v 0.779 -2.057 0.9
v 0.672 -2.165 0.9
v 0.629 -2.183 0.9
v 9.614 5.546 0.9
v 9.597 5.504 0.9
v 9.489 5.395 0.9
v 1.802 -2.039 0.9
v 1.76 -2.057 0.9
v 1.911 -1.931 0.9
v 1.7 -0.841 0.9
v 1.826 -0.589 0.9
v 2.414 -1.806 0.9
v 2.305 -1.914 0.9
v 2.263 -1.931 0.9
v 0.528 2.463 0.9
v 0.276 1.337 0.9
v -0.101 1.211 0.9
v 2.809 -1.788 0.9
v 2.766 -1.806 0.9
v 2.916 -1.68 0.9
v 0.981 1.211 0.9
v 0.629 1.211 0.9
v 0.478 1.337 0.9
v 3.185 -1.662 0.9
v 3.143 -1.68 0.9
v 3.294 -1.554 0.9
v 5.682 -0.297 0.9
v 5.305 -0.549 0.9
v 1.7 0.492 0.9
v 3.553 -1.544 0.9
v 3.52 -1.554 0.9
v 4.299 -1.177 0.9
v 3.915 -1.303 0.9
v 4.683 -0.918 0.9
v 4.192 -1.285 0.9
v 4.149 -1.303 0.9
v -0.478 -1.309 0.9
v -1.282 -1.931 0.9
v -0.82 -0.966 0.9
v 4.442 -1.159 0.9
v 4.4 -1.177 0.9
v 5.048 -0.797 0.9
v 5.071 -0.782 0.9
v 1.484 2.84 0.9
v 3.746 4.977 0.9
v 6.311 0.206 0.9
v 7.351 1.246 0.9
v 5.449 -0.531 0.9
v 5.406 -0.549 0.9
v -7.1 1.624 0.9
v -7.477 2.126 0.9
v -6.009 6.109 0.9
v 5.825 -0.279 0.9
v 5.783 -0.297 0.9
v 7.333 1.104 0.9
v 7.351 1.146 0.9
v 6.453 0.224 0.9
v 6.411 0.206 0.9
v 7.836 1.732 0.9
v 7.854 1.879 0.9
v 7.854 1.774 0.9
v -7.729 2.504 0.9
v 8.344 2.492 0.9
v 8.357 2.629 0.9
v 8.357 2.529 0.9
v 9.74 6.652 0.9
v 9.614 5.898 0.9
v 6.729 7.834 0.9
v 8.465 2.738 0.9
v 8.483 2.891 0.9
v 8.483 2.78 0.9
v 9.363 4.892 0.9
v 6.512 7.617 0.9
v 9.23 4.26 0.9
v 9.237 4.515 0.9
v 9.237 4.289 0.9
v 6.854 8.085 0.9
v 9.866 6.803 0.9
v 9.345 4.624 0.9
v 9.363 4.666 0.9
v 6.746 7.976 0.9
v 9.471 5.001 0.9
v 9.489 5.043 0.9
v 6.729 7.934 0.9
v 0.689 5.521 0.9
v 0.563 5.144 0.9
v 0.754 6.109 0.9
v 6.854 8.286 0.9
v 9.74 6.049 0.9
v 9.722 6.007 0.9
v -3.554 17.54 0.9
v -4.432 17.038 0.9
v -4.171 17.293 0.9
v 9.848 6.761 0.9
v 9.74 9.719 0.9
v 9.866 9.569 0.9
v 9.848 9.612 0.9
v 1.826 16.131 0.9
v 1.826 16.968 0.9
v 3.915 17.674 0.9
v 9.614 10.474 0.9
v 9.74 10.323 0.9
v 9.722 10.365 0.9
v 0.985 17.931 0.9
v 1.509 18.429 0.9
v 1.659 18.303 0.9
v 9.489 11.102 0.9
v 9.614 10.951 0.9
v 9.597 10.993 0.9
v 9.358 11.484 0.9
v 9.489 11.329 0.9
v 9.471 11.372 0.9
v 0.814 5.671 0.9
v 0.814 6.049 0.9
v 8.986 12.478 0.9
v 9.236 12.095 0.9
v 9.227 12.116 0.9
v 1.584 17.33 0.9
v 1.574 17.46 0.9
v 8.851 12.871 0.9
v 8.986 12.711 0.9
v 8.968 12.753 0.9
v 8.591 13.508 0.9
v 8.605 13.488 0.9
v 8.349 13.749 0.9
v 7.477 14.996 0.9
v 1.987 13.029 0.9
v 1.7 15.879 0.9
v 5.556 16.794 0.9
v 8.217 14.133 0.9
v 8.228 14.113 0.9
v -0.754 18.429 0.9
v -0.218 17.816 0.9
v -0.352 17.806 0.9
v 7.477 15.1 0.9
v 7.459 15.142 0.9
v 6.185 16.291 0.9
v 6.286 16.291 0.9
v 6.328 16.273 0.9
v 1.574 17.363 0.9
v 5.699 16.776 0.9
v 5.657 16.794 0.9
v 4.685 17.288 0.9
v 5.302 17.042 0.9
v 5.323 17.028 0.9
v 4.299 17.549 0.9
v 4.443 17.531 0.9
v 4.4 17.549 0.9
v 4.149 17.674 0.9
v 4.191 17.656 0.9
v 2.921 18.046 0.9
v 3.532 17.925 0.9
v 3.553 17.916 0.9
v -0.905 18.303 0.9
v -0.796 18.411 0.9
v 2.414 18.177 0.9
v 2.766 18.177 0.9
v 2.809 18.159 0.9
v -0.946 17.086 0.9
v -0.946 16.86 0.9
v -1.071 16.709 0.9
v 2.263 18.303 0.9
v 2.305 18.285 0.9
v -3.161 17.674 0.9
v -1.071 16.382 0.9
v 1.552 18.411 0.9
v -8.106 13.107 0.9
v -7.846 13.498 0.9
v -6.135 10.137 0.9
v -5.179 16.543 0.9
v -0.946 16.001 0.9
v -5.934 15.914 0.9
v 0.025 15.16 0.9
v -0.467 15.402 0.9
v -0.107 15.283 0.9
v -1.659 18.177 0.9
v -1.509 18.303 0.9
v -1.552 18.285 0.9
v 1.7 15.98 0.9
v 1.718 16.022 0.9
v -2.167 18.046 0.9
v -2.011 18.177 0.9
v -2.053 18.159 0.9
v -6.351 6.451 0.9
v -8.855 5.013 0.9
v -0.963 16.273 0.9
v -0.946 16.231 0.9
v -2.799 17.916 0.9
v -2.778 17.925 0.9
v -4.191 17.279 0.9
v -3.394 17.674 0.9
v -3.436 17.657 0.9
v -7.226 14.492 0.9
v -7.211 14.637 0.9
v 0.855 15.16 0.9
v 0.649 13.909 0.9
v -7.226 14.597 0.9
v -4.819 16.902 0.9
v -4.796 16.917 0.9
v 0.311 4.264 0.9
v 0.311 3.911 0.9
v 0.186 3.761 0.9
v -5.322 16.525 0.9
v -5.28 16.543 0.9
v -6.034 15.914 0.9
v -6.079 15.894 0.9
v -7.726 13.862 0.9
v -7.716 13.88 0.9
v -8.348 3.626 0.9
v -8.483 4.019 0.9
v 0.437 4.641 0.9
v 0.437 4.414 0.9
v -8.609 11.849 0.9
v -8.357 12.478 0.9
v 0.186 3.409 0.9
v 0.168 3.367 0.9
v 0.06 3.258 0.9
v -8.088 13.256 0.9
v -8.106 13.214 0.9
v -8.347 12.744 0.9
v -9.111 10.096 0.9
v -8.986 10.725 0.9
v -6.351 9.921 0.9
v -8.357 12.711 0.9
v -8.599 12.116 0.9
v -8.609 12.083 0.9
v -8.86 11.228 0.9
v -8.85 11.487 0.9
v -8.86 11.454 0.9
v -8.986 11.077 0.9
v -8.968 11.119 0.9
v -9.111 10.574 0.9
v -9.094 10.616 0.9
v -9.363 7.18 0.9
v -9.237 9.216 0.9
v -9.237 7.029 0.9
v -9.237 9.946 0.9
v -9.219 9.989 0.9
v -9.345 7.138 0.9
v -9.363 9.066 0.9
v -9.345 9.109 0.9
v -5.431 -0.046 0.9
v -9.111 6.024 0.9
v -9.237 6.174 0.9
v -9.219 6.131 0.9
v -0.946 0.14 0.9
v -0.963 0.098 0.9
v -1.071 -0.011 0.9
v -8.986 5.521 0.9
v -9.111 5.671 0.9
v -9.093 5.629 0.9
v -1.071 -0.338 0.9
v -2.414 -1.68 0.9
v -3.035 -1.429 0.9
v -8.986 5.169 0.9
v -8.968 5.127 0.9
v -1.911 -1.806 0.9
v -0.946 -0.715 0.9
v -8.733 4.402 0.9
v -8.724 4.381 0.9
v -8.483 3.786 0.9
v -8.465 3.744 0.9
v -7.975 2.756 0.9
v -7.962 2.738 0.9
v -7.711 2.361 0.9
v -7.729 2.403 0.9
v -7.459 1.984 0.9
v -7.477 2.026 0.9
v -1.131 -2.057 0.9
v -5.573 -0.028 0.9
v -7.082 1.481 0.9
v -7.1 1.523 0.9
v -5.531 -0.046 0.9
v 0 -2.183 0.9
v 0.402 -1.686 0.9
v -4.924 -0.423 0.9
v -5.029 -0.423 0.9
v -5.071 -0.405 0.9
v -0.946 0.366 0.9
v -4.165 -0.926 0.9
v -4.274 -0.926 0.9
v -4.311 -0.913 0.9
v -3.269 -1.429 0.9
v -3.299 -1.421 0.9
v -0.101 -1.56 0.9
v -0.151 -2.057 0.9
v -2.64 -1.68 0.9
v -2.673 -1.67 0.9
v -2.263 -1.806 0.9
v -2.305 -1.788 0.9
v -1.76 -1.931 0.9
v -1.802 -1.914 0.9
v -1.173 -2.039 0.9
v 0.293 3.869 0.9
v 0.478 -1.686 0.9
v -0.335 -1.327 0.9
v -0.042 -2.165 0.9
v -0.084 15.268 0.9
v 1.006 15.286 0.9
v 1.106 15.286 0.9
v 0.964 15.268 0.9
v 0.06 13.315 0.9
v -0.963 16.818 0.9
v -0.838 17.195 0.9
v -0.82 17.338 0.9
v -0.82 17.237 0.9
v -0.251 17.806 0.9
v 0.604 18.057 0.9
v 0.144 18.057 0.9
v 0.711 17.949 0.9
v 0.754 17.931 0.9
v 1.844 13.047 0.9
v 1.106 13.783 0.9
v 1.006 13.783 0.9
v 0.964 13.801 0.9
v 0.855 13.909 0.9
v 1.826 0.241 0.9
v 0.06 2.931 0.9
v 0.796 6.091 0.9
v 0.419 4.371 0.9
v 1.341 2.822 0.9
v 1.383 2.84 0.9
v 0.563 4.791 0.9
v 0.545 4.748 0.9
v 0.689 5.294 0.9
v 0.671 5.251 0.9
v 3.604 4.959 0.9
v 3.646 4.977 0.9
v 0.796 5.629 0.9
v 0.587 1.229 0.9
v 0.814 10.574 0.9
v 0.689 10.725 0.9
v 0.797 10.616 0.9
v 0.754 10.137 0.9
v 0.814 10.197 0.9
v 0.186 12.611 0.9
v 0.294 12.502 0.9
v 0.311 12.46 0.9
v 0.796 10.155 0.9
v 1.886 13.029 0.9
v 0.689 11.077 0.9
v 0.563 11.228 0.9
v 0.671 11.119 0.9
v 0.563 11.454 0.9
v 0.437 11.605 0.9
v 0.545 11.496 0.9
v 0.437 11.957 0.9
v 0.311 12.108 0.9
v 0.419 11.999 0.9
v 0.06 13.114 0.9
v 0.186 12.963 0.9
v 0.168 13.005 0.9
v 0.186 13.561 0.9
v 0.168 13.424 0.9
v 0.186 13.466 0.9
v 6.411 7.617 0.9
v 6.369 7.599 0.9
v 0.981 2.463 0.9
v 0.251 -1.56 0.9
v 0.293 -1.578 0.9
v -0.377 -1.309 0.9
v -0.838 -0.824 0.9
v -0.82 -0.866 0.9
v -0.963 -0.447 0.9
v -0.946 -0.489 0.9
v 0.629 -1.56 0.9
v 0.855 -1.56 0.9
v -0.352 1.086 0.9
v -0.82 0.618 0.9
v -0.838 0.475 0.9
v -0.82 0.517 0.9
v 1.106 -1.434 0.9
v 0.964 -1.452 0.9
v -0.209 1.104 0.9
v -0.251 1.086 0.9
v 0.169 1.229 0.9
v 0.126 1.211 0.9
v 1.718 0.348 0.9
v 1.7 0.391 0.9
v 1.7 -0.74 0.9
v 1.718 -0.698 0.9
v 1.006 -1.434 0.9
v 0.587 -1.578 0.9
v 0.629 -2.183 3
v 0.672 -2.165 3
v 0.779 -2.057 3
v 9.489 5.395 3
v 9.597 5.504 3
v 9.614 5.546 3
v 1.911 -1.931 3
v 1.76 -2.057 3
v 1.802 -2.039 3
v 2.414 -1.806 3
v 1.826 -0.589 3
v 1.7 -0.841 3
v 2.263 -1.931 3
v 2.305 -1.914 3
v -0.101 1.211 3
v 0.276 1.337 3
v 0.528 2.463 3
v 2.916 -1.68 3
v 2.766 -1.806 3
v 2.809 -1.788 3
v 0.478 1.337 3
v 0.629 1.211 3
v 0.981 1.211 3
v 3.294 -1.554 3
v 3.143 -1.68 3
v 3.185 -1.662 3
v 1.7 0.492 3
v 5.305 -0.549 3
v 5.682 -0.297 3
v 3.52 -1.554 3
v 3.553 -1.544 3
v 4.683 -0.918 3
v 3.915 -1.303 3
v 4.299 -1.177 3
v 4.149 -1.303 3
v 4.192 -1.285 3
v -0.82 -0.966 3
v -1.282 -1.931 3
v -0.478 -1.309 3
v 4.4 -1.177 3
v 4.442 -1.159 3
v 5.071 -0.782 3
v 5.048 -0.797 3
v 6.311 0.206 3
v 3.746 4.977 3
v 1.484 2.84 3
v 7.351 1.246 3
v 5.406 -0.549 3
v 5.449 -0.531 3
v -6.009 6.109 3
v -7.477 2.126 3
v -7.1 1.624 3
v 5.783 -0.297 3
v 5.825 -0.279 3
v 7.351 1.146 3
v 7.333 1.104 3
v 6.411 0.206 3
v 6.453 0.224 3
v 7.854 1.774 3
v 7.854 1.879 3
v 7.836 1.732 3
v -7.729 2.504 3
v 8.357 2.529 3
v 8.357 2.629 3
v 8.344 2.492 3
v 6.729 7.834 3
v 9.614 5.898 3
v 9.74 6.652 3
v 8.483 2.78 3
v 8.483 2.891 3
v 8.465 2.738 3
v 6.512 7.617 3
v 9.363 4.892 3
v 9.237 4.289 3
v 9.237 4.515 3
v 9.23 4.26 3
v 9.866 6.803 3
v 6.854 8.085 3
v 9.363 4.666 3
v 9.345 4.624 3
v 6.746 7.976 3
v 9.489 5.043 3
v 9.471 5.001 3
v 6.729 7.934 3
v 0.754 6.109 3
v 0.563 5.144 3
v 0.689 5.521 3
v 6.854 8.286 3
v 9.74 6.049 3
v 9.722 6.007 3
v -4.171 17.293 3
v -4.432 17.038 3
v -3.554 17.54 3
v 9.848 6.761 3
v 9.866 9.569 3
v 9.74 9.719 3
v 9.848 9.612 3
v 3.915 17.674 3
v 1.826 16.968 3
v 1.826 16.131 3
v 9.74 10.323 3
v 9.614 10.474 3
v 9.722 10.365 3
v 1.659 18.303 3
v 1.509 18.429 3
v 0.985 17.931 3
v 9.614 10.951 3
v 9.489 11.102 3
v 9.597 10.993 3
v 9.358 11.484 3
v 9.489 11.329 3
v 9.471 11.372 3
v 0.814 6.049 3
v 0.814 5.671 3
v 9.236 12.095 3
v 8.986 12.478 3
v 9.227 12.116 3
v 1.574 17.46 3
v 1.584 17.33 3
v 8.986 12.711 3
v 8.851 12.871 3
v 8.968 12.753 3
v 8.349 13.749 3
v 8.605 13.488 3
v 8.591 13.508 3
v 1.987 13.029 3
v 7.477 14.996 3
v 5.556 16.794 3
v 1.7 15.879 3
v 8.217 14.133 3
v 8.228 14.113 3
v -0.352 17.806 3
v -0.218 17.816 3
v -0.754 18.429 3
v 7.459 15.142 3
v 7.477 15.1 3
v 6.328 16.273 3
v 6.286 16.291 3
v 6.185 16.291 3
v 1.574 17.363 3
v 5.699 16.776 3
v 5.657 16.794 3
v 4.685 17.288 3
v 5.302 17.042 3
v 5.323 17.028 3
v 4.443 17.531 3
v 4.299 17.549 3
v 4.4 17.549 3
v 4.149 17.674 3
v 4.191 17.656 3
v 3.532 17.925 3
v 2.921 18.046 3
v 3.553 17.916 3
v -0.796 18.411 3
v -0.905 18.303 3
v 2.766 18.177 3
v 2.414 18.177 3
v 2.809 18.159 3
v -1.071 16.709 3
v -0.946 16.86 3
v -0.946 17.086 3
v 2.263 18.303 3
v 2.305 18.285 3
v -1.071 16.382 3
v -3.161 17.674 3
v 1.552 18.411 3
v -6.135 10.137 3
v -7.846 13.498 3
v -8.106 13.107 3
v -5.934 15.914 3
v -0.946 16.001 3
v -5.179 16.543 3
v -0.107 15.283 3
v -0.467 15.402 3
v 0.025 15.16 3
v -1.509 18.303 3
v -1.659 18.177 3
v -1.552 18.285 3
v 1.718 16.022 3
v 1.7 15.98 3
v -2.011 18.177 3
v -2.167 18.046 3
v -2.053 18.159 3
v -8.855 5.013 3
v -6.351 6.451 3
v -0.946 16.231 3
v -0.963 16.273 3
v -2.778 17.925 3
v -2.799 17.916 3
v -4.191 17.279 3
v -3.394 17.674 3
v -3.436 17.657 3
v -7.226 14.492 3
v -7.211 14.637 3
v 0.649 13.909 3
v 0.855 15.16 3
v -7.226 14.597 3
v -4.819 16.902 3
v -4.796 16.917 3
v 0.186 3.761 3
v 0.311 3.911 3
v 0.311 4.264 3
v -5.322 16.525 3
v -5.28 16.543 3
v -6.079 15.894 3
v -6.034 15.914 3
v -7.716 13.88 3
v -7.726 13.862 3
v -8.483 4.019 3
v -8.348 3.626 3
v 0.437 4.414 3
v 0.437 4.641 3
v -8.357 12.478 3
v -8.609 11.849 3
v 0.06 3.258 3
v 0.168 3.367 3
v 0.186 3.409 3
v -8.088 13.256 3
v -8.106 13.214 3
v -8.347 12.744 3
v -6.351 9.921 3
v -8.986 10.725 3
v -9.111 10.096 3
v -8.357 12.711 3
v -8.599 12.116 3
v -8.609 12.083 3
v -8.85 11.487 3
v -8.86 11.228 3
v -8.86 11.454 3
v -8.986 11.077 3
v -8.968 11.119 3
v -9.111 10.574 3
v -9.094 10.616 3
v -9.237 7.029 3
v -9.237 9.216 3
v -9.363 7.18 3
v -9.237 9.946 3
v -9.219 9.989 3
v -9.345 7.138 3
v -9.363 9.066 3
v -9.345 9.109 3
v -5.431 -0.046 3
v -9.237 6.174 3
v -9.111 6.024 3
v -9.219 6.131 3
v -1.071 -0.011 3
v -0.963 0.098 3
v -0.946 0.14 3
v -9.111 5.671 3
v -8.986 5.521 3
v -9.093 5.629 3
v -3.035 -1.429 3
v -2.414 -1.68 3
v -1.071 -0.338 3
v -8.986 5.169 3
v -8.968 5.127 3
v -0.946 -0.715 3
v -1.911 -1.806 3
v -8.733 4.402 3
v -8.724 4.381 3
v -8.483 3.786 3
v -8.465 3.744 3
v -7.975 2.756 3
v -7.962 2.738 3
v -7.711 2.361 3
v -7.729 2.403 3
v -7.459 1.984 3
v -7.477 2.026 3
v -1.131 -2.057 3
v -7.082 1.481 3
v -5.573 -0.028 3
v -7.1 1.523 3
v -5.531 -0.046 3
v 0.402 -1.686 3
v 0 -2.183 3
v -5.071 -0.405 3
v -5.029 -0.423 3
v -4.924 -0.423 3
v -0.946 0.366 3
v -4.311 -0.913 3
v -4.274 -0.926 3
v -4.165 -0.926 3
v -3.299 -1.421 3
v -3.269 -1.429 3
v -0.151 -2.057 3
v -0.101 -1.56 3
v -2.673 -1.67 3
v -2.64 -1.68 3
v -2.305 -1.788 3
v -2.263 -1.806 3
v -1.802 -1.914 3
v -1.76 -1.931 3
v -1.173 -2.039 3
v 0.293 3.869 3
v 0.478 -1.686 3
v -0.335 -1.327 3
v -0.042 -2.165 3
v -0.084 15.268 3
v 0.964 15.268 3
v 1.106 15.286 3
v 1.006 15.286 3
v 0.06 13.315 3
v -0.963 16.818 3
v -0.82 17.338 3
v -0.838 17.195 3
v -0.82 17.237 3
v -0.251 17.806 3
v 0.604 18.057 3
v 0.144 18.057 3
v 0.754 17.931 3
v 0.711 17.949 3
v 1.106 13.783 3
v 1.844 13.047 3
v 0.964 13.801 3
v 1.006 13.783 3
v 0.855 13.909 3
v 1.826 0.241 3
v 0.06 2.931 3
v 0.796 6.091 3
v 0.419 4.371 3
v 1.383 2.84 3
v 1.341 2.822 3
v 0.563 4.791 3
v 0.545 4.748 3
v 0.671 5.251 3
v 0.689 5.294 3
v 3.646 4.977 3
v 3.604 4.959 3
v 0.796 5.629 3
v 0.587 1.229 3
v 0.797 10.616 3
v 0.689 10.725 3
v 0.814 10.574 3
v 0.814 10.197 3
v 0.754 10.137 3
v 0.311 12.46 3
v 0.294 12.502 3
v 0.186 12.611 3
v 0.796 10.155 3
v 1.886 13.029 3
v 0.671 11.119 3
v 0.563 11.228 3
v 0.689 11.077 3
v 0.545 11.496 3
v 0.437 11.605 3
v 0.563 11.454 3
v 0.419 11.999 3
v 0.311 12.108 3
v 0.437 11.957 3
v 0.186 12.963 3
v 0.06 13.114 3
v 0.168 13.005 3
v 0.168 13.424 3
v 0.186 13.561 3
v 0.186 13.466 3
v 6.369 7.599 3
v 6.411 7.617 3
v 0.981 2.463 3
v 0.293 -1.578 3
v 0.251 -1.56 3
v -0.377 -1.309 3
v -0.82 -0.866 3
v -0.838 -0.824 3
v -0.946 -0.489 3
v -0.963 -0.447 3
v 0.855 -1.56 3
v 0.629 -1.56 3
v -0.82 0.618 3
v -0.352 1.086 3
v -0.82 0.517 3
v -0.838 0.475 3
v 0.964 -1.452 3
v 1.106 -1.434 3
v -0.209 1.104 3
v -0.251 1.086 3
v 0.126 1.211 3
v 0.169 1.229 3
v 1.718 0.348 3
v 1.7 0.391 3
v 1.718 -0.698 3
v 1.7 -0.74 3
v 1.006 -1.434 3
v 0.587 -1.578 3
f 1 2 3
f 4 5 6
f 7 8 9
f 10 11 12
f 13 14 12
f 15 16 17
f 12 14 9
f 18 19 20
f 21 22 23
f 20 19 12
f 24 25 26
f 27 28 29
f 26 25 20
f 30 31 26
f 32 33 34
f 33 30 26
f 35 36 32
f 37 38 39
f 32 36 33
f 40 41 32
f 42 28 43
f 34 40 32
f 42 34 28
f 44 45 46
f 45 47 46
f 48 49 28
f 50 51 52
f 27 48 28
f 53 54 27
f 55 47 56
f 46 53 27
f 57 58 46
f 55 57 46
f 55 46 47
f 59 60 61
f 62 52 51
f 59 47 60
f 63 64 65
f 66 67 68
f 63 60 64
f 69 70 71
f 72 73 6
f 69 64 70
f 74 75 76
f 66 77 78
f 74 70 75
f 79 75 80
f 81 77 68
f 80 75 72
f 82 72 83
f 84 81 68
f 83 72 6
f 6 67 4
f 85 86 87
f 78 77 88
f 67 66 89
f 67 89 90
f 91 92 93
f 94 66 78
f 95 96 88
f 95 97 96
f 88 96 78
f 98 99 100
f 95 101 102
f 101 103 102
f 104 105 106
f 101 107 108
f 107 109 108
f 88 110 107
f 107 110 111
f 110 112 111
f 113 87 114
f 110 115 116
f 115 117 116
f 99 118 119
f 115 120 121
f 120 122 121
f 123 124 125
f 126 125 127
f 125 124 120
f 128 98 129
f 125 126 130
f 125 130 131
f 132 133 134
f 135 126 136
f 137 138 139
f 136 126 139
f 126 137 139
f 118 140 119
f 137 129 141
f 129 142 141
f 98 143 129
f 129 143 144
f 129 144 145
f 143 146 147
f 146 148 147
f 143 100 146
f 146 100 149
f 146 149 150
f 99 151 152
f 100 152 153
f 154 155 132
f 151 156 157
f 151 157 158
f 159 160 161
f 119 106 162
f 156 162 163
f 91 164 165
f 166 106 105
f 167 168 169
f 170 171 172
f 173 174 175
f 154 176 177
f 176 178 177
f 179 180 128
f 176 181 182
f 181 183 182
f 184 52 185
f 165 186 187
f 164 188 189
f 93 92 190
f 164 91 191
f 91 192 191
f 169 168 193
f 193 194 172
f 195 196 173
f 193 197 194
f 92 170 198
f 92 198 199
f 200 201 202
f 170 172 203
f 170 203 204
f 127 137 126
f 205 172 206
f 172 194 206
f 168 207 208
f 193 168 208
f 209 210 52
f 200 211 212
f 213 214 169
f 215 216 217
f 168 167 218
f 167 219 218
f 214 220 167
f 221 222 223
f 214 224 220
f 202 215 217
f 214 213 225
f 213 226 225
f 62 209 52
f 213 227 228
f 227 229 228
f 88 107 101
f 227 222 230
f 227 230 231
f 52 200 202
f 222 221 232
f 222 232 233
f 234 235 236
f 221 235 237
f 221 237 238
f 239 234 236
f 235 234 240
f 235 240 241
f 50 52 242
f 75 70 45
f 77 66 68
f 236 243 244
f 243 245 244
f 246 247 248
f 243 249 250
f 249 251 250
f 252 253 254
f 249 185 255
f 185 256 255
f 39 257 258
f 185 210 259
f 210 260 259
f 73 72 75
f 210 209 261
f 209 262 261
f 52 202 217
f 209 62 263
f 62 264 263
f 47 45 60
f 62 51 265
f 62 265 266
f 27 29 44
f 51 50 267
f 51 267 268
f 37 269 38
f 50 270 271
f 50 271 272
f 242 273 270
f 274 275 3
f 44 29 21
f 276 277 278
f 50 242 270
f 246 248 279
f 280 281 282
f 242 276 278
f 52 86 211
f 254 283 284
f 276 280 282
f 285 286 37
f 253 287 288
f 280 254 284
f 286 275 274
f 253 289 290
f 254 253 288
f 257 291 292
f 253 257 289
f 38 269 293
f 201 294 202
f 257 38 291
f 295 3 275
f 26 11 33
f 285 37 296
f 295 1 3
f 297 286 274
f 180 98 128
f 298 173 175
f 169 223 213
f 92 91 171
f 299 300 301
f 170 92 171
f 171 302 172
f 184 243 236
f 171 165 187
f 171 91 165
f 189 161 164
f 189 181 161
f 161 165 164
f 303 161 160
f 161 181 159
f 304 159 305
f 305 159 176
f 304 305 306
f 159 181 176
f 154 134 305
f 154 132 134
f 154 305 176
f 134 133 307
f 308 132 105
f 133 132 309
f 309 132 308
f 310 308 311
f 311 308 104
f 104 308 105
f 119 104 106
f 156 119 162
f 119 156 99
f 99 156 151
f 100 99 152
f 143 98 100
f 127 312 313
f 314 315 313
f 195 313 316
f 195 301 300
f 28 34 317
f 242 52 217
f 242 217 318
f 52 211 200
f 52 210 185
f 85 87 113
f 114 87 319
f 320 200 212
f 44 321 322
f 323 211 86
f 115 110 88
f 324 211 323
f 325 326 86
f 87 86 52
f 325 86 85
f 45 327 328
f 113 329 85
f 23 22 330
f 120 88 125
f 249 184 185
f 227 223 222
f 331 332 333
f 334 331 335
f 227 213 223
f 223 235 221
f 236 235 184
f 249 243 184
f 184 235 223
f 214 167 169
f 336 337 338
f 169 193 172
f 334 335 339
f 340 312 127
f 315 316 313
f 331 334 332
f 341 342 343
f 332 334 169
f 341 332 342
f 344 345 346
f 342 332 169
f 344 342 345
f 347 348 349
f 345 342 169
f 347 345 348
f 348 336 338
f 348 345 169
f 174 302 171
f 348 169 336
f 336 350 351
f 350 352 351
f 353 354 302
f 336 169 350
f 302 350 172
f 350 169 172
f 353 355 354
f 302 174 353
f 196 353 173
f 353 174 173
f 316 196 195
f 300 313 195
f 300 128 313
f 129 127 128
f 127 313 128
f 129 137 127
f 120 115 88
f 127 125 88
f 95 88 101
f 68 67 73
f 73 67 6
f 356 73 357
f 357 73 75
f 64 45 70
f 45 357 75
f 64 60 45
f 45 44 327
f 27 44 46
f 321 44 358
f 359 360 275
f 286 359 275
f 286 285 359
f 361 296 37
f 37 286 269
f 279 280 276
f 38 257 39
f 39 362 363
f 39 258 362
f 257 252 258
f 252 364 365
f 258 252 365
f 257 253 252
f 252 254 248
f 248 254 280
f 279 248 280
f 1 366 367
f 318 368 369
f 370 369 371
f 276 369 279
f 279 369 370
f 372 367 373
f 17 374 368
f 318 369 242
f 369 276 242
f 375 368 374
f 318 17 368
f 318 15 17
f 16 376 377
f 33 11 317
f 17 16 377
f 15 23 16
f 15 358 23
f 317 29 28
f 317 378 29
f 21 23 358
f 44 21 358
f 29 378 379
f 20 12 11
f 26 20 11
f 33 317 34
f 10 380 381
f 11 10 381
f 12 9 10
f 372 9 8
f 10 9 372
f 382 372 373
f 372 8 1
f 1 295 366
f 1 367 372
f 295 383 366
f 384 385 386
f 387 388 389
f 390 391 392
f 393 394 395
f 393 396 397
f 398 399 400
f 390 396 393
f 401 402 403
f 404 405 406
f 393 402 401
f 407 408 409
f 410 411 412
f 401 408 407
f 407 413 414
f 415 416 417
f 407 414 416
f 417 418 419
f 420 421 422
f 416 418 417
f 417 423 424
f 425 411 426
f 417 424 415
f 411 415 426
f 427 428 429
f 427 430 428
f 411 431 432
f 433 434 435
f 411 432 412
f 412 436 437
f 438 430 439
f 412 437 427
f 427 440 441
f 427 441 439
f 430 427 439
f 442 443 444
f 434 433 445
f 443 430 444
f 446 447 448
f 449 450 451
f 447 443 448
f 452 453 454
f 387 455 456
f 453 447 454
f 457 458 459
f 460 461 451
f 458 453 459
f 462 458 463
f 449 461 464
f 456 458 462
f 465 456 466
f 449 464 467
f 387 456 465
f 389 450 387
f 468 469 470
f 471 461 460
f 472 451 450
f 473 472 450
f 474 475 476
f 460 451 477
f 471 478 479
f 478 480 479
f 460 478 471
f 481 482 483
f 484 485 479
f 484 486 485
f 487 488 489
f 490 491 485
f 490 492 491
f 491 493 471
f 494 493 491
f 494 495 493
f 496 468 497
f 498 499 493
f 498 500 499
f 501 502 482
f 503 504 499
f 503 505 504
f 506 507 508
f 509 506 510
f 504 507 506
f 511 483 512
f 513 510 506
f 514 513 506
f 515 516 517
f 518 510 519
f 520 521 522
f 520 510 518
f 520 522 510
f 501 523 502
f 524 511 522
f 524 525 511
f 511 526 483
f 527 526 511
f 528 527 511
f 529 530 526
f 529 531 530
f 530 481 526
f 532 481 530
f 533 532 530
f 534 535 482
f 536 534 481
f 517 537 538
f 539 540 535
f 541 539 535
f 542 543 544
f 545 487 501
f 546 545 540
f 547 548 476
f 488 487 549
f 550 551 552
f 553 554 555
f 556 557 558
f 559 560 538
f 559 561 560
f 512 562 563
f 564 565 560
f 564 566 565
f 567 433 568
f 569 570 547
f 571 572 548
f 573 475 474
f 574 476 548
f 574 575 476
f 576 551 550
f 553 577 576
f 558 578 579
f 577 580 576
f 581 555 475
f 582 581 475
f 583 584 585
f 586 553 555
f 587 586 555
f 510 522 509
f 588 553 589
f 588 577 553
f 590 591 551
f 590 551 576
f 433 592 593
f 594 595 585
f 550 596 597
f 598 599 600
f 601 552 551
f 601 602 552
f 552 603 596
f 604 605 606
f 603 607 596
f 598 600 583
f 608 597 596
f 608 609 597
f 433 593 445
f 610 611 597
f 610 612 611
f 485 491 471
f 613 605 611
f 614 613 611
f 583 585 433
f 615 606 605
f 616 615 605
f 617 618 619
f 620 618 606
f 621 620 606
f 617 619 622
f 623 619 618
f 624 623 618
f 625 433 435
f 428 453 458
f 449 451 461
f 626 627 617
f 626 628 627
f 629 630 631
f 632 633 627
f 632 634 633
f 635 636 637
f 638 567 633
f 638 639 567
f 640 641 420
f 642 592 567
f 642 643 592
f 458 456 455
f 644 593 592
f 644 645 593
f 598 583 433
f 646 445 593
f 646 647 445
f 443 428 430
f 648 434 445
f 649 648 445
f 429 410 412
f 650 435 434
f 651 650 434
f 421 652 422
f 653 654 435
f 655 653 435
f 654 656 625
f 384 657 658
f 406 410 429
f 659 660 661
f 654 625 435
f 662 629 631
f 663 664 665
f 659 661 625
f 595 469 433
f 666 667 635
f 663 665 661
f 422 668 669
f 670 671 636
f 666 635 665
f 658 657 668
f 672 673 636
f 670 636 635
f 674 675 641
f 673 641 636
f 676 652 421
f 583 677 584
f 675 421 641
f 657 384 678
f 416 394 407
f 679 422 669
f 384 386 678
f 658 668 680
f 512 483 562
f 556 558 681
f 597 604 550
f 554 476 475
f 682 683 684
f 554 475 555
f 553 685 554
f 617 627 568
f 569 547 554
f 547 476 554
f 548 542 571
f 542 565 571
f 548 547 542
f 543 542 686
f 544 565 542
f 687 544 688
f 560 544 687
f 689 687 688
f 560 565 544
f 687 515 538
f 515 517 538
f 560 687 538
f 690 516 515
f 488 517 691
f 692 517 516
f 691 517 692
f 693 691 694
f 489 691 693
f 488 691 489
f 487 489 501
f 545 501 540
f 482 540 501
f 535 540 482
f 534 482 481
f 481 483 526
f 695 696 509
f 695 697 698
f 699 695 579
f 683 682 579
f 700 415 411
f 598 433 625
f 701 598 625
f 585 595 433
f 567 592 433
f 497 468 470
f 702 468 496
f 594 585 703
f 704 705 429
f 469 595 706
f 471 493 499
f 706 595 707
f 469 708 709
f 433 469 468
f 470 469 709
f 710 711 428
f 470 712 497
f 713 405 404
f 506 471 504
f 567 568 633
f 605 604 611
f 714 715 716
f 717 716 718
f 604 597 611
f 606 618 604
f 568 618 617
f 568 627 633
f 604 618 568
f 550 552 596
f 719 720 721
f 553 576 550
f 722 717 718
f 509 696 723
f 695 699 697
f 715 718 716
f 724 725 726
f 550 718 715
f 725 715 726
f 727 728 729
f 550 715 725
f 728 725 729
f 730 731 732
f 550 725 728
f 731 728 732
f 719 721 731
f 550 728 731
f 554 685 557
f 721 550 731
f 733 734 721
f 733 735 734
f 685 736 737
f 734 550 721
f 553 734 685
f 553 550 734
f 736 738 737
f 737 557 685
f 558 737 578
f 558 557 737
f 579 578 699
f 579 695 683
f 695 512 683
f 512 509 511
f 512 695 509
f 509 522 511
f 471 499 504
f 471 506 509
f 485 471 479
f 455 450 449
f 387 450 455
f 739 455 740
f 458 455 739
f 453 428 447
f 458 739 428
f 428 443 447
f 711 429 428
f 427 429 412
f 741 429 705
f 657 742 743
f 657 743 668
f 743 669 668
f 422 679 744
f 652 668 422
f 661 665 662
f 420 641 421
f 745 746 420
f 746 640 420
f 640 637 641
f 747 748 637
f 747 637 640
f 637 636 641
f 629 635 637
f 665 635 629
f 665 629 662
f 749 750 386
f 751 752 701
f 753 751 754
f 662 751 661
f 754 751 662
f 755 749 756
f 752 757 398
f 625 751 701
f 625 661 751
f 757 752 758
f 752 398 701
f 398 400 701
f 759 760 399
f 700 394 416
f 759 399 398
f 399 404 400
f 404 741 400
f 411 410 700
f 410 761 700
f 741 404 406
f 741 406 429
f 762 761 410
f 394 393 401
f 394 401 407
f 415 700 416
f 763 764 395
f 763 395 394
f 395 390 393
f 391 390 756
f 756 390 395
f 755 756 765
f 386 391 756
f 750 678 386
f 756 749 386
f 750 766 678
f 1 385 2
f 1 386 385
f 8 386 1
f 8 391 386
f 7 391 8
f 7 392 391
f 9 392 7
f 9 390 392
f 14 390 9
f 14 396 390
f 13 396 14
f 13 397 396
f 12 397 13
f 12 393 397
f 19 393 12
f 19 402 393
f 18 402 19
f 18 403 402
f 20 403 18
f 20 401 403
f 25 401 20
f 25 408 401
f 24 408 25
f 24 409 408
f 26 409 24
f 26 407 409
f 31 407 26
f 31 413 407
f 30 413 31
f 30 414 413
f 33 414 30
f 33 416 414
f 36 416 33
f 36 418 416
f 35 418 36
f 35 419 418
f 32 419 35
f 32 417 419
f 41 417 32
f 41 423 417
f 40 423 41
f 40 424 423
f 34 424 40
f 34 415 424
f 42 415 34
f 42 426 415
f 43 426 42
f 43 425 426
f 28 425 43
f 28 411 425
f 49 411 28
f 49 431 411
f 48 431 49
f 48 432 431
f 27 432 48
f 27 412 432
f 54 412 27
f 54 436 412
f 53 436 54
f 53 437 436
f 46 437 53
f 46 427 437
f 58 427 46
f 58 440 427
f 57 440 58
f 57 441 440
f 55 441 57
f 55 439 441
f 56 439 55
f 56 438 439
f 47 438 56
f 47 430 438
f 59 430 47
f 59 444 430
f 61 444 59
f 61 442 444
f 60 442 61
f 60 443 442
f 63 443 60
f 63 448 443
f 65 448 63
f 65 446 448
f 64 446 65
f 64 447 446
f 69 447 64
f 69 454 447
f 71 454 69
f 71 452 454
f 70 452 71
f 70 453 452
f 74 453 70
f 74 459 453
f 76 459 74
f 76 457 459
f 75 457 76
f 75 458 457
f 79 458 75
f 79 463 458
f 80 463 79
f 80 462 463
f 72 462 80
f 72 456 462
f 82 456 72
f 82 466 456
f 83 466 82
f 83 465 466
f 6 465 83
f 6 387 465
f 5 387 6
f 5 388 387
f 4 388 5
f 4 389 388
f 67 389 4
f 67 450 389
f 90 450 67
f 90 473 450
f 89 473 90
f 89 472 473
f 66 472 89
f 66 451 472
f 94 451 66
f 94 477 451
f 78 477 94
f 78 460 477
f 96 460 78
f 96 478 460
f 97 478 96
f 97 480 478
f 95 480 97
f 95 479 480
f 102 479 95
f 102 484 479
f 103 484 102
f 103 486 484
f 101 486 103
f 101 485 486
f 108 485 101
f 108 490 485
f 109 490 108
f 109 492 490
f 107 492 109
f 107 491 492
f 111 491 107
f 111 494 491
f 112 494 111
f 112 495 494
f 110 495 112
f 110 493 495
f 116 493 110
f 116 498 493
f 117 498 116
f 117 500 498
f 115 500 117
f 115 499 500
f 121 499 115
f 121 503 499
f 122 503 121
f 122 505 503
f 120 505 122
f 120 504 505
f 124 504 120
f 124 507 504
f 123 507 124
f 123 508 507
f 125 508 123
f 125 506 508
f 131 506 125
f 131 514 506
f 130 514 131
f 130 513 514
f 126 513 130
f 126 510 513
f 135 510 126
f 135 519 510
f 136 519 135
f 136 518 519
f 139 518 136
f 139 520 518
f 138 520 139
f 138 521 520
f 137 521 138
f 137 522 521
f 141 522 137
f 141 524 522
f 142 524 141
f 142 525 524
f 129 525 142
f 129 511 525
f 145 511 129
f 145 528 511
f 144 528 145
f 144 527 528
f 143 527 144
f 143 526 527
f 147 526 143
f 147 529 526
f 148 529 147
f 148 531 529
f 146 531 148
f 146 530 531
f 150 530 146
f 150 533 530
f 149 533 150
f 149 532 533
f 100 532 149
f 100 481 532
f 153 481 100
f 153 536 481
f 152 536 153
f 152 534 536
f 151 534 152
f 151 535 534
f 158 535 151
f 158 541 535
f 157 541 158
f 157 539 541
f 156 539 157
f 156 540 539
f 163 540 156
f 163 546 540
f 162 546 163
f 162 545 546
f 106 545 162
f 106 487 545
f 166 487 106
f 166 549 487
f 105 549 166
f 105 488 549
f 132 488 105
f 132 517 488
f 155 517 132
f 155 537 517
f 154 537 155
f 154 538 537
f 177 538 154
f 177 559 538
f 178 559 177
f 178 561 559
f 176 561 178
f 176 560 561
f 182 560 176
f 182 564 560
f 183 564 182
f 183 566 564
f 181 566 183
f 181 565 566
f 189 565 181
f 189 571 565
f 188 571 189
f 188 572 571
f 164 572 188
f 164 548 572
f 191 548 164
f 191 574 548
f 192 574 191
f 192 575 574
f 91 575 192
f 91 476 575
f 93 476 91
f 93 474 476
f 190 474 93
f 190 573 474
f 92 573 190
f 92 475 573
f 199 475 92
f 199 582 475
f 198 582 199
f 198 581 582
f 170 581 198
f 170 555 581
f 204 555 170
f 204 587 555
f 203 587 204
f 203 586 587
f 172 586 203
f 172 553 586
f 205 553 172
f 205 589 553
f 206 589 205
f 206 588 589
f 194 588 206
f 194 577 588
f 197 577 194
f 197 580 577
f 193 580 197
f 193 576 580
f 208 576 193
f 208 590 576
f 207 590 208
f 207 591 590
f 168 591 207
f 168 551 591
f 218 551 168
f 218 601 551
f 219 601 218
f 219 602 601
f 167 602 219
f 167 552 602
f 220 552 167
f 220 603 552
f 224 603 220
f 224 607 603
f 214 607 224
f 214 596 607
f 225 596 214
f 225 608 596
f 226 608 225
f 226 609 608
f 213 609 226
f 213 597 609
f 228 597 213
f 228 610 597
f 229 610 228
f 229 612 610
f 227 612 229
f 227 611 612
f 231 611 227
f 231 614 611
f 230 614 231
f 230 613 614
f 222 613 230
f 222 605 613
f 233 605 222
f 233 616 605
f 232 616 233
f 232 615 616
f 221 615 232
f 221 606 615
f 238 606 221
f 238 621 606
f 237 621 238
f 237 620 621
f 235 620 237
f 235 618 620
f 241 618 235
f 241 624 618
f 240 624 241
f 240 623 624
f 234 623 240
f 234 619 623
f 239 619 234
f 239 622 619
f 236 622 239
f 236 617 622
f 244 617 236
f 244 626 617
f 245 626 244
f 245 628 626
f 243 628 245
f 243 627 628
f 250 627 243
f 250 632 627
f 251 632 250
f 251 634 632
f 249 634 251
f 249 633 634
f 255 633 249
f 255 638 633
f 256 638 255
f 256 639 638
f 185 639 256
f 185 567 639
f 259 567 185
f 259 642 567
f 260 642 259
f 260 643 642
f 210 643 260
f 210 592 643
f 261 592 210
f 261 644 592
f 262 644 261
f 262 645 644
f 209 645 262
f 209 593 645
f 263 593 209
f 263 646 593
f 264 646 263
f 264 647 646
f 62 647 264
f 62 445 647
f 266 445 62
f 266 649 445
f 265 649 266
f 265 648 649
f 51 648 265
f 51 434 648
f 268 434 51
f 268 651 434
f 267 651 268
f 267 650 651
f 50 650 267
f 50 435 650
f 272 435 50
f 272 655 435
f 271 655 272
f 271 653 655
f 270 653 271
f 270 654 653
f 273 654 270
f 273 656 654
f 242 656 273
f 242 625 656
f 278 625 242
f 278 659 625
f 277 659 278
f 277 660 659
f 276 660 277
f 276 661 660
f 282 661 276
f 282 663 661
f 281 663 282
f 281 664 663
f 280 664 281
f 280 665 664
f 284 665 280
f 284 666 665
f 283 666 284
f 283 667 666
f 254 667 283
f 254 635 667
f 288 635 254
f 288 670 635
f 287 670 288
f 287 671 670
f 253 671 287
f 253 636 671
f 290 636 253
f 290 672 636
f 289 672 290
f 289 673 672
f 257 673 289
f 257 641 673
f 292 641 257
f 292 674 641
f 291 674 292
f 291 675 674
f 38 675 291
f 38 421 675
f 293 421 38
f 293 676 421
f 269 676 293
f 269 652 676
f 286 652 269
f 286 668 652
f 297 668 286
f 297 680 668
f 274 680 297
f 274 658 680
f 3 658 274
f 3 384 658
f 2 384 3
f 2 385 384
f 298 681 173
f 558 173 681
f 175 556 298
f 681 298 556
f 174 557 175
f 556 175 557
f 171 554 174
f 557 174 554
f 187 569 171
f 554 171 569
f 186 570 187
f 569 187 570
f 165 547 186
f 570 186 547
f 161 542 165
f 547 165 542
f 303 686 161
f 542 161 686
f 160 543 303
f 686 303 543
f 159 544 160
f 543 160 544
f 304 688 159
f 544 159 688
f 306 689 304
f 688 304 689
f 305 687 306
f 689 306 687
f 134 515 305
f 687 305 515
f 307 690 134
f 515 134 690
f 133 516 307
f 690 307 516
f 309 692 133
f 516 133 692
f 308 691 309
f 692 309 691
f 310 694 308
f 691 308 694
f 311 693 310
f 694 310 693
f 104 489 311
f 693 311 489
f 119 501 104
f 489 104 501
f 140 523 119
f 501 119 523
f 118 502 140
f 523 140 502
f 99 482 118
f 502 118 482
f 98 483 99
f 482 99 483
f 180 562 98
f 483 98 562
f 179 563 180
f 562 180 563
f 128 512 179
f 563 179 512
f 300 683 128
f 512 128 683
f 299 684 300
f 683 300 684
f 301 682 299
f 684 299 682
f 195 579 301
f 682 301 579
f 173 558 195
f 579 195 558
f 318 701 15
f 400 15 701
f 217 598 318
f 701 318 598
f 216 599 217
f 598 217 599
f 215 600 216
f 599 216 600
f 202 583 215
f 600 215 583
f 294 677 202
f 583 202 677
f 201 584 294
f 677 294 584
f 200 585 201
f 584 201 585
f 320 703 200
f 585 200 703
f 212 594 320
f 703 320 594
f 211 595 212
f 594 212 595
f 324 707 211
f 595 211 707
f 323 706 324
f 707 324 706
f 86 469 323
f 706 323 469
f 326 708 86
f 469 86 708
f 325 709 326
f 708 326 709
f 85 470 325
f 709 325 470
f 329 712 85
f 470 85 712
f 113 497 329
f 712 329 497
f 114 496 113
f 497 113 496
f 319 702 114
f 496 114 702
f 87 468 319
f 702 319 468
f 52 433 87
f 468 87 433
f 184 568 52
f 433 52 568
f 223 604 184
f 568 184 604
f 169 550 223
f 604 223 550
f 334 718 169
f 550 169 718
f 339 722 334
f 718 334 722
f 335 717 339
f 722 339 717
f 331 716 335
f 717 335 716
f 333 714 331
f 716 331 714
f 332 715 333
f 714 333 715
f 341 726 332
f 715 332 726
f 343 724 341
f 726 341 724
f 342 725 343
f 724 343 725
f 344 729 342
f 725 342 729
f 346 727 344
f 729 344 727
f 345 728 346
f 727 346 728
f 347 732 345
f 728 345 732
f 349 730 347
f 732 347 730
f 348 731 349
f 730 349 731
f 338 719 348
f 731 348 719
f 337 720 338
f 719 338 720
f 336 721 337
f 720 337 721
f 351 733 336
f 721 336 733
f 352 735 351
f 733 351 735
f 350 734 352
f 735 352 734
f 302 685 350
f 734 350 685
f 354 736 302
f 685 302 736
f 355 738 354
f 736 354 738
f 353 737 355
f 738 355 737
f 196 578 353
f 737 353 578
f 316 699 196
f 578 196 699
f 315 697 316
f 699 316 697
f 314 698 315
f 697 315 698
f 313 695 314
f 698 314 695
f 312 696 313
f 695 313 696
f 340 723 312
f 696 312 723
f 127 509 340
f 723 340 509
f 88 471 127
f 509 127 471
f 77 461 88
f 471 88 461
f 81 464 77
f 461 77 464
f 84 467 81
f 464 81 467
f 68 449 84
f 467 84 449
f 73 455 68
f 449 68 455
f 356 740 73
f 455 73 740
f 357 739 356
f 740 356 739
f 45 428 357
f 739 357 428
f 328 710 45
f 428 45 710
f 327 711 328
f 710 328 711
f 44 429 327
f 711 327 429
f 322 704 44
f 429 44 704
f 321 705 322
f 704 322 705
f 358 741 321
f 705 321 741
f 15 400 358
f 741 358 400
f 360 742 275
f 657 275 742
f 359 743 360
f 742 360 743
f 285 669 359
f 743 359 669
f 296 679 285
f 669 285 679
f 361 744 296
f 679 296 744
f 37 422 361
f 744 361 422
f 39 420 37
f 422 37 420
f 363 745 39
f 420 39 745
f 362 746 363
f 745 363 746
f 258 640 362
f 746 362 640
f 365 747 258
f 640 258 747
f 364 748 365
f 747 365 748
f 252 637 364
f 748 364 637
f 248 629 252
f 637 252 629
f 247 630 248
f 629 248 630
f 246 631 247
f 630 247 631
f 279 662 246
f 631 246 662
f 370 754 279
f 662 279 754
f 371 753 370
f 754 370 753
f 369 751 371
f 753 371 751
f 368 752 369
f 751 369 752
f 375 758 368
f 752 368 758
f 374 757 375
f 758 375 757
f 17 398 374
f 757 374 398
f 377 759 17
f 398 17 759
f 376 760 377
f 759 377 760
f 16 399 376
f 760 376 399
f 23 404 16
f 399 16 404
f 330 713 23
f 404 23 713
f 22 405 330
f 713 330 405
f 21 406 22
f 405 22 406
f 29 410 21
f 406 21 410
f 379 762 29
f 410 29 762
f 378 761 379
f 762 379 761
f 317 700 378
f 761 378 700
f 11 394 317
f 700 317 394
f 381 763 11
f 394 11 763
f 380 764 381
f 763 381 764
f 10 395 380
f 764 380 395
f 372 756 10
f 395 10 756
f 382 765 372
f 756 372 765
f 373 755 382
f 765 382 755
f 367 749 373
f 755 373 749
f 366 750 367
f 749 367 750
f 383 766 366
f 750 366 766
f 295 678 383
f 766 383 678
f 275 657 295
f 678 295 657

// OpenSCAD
$fn = 24;
translate([0, -2.500, 0.900])
  linear_extrude(height=2.100) {
offset(r=0.06, $fn=8) {
    polygon(points=[[-0.754,20.869],[-0.880,20.743],[-1.509,20.743],[-1.634,20.617],[-2.011,20.617],[-2.137,20.491],[-2.766,20.366],[-3.143,20.114],[-3.394,20.114],[-3.520,19.989],[-4.149,19.737],[-4.400,19.486],[-4.777,19.360],[-5.154,18.983],[-5.280,18.983],[-5.909,18.354],[-6.034,18.354],[-7.166,17.097],[-7.166,16.971],[-7.669,16.343],[-7.794,15.966],[-8.046,15.714],[-8.046,15.589],[-8.297,15.211],[-8.297,14.960],[-8.549,14.583],[-8.549,14.331],[-8.800,13.954],[-8.800,13.703],[-8.926,13.577],[-8.926,13.200],[-9.051,13.074],[-9.051,12.571],[-9.177,12.446],[-9.177,11.691],[-9.303,11.566],[-9.303,9.680],[-9.177,9.554],[-9.177,8.674],[-9.051,8.549],[-9.051,8.171],[-8.926,8.046],[-8.926,7.669],[-8.800,7.543],[-8.674,6.914],[-8.423,6.537],[-8.423,6.286],[-8.297,6.160],[-7.920,5.280],[-7.669,5.029],[-7.669,4.903],[-7.417,4.651],[-7.417,4.526],[-7.040,4.149],[-7.040,4.023],[-5.531,2.514],[-5.406,2.514],[-5.029,2.137],[-4.903,2.137],[-4.274,1.634],[-4.149,1.634],[-3.269,1.131],[-3.017,1.131],[-2.640,0.880],[-2.389,0.880],[-2.263,0.754],[-1.886,0.754],[-1.760,0.629],[-1.257,0.629],[-1.131,0.503],[-0.126,0.503],[0.000,0.377],[0.629,0.377],[0.754,0.503],[1.760,0.503],[1.886,0.629],[2.263,0.629],[2.389,0.754],[2.766,0.754],[2.891,0.880],[3.143,0.880],[3.269,1.006],[3.520,1.006],[3.897,1.257],[4.149,1.257],[4.274,1.383],[4.400,1.383],[4.651,1.634],[5.029,1.760],[5.280,2.011],[5.406,2.011],[5.657,2.263],[5.783,2.263],[6.286,2.766],[6.411,2.766],[7.291,3.646],[7.291,3.771],[7.794,4.274],[7.794,4.400],[8.297,5.029],[8.297,5.154],[8.423,5.280],[8.423,5.406],[9.177,6.789],[9.177,7.040],[9.303,7.166],[9.303,7.417],[9.429,7.543],[9.429,7.920],[9.554,8.046],[9.554,8.423],[9.680,8.549],[9.680,9.177],[9.806,9.303],[9.806,12.069],[9.680,12.194],[9.680,12.823],[9.554,12.949],[9.554,13.451],[9.429,13.577],[9.429,13.829],[9.303,13.954],[9.177,14.583],[8.926,14.960],[8.926,15.211],[8.800,15.337],[8.549,15.966],[8.297,16.217],[8.171,16.594],[7.417,17.474],[7.417,17.600],[6.286,18.731],[6.160,18.731],[5.657,19.234],[5.531,19.234],[5.280,19.486],[4.651,19.737],[4.400,19.989],[4.274,19.989],[4.149,20.114],[3.897,20.114],[3.520,20.366],[2.891,20.491],[2.766,20.617],[2.389,20.617],[2.263,20.743],[1.634,20.743],[1.509,20.869],[0.251,3.897],[0.503,3.897],[0.629,3.771],[1.006,3.771],[1.760,3.017],[1.760,2.891],[1.886,2.766],[1.886,1.886],[1.760,1.760],[1.760,1.634],[1.131,1.006],[1.006,1.006],[0.880,0.880],[0.629,0.880],[0.503,0.754],[0.377,0.754],[0.251,0.880],[-0.126,0.880],[-0.377,1.131],[-0.503,1.131],[-0.880,1.509],[-0.880,1.634],[-1.006,1.760],[-1.006,2.011],[-1.131,2.137],[-1.131,2.514],[-1.006,2.640],[-1.006,2.891],[-0.880,3.017],[-0.880,3.143],[-0.377,3.646],[-0.251,3.646],[-0.126,3.771],[0.126,3.771],[0.629,16.469],[0.880,16.469],[1.006,16.343],[1.131,16.343],[1.886,15.589],[2.011,15.589],[6.914,10.811],[6.914,10.560],[6.789,10.434],[6.789,10.309],[6.537,10.057],[6.411,10.057],[3.771,7.417],[3.646,7.417],[1.509,5.280],[1.383,5.280],[1.006,4.903],[0.503,4.903],[0.000,5.406],[0.000,5.783],[0.126,5.909],[0.126,6.286],[0.251,6.411],[0.251,6.789],[0.377,6.914],[0.377,7.166],[0.503,7.291],[0.503,7.669],[0.629,7.794],[0.629,8.046],[0.754,8.171],[0.754,8.549],[-6.034,8.549],[-6.411,8.926],[-6.411,12.446],[-6.160,12.697],[0.754,12.697],[0.754,13.074],[0.629,13.200],[0.629,13.577],[0.503,13.703],[0.503,13.954],[0.377,14.080],[0.377,14.457],[0.251,14.583],[0.251,14.960],[0.126,15.086],[0.126,15.463],[0.000,15.589],[0.000,15.840],[0.126,15.966],[0.126,16.091],[0.126,20.617],[0.629,20.617],[0.754,20.491],[1.006,20.491],[1.634,19.989],[1.634,19.863],[1.886,19.486],[1.886,18.606],[1.760,18.480],[1.760,18.354],[1.131,17.726],[1.006,17.726],[0.880,17.600],[0.000,17.600],[-0.126,17.726],[-0.503,17.851],[-1.006,18.480],[-1.006,18.731],[-1.131,18.857],[-1.131,19.234],[-1.006,19.360],[-1.006,19.611],[-0.880,19.737],[-0.880,19.863],[-0.377,20.366],[-0.251,20.366]], paths=[[0,1,2,3,4,5,6,7,8,9,10,11,12,13,14,15,16,17,18,19,20,21,22,23,24,25,26,27,28,29,30,31,32,33,34,35,36,37,38,39,40,41,42,43,44,45,46,47,48,49,50,51,52,53,54,55,56,57,58,59,60,61,62,63,64,65,66,67,68,69,70,71,72,73,74,75,76,77,78,79,80,81,82,83,84,85,86,87,88,89,90,91,92,93,94,95,96,97,98,99,100,101,102,103,104,105,106,107,108,109,110,111,112,113,114,115,116,117,118,119,120,121,122,123,124,125,126,127,128,129,130,131,132,133,134,135,136,137,138,139,140,141,142,143,144,145,146,147],[148,149,150,151,152,153,154,155,156,157,158,159,160,161,162,163,164,165,166,167,168,169,170,171,172,173,174,175,176,177,178,179,180,181],[182,183,184,185,186,187,188,189,190,191,192,193,194,195,196,197,198,199,200,201,202,203,204,205,206,207,208,209,210,211,212,213,214,215,216,217,218,219,220,221,222,223,224,225,226,227,228,229,230,231,232,233],[234,235,236,237,238,239,240,241,242,243,244,245,246,247,248,249,250,251,252,253,254,255,256,257,258,259]]);
}
}
